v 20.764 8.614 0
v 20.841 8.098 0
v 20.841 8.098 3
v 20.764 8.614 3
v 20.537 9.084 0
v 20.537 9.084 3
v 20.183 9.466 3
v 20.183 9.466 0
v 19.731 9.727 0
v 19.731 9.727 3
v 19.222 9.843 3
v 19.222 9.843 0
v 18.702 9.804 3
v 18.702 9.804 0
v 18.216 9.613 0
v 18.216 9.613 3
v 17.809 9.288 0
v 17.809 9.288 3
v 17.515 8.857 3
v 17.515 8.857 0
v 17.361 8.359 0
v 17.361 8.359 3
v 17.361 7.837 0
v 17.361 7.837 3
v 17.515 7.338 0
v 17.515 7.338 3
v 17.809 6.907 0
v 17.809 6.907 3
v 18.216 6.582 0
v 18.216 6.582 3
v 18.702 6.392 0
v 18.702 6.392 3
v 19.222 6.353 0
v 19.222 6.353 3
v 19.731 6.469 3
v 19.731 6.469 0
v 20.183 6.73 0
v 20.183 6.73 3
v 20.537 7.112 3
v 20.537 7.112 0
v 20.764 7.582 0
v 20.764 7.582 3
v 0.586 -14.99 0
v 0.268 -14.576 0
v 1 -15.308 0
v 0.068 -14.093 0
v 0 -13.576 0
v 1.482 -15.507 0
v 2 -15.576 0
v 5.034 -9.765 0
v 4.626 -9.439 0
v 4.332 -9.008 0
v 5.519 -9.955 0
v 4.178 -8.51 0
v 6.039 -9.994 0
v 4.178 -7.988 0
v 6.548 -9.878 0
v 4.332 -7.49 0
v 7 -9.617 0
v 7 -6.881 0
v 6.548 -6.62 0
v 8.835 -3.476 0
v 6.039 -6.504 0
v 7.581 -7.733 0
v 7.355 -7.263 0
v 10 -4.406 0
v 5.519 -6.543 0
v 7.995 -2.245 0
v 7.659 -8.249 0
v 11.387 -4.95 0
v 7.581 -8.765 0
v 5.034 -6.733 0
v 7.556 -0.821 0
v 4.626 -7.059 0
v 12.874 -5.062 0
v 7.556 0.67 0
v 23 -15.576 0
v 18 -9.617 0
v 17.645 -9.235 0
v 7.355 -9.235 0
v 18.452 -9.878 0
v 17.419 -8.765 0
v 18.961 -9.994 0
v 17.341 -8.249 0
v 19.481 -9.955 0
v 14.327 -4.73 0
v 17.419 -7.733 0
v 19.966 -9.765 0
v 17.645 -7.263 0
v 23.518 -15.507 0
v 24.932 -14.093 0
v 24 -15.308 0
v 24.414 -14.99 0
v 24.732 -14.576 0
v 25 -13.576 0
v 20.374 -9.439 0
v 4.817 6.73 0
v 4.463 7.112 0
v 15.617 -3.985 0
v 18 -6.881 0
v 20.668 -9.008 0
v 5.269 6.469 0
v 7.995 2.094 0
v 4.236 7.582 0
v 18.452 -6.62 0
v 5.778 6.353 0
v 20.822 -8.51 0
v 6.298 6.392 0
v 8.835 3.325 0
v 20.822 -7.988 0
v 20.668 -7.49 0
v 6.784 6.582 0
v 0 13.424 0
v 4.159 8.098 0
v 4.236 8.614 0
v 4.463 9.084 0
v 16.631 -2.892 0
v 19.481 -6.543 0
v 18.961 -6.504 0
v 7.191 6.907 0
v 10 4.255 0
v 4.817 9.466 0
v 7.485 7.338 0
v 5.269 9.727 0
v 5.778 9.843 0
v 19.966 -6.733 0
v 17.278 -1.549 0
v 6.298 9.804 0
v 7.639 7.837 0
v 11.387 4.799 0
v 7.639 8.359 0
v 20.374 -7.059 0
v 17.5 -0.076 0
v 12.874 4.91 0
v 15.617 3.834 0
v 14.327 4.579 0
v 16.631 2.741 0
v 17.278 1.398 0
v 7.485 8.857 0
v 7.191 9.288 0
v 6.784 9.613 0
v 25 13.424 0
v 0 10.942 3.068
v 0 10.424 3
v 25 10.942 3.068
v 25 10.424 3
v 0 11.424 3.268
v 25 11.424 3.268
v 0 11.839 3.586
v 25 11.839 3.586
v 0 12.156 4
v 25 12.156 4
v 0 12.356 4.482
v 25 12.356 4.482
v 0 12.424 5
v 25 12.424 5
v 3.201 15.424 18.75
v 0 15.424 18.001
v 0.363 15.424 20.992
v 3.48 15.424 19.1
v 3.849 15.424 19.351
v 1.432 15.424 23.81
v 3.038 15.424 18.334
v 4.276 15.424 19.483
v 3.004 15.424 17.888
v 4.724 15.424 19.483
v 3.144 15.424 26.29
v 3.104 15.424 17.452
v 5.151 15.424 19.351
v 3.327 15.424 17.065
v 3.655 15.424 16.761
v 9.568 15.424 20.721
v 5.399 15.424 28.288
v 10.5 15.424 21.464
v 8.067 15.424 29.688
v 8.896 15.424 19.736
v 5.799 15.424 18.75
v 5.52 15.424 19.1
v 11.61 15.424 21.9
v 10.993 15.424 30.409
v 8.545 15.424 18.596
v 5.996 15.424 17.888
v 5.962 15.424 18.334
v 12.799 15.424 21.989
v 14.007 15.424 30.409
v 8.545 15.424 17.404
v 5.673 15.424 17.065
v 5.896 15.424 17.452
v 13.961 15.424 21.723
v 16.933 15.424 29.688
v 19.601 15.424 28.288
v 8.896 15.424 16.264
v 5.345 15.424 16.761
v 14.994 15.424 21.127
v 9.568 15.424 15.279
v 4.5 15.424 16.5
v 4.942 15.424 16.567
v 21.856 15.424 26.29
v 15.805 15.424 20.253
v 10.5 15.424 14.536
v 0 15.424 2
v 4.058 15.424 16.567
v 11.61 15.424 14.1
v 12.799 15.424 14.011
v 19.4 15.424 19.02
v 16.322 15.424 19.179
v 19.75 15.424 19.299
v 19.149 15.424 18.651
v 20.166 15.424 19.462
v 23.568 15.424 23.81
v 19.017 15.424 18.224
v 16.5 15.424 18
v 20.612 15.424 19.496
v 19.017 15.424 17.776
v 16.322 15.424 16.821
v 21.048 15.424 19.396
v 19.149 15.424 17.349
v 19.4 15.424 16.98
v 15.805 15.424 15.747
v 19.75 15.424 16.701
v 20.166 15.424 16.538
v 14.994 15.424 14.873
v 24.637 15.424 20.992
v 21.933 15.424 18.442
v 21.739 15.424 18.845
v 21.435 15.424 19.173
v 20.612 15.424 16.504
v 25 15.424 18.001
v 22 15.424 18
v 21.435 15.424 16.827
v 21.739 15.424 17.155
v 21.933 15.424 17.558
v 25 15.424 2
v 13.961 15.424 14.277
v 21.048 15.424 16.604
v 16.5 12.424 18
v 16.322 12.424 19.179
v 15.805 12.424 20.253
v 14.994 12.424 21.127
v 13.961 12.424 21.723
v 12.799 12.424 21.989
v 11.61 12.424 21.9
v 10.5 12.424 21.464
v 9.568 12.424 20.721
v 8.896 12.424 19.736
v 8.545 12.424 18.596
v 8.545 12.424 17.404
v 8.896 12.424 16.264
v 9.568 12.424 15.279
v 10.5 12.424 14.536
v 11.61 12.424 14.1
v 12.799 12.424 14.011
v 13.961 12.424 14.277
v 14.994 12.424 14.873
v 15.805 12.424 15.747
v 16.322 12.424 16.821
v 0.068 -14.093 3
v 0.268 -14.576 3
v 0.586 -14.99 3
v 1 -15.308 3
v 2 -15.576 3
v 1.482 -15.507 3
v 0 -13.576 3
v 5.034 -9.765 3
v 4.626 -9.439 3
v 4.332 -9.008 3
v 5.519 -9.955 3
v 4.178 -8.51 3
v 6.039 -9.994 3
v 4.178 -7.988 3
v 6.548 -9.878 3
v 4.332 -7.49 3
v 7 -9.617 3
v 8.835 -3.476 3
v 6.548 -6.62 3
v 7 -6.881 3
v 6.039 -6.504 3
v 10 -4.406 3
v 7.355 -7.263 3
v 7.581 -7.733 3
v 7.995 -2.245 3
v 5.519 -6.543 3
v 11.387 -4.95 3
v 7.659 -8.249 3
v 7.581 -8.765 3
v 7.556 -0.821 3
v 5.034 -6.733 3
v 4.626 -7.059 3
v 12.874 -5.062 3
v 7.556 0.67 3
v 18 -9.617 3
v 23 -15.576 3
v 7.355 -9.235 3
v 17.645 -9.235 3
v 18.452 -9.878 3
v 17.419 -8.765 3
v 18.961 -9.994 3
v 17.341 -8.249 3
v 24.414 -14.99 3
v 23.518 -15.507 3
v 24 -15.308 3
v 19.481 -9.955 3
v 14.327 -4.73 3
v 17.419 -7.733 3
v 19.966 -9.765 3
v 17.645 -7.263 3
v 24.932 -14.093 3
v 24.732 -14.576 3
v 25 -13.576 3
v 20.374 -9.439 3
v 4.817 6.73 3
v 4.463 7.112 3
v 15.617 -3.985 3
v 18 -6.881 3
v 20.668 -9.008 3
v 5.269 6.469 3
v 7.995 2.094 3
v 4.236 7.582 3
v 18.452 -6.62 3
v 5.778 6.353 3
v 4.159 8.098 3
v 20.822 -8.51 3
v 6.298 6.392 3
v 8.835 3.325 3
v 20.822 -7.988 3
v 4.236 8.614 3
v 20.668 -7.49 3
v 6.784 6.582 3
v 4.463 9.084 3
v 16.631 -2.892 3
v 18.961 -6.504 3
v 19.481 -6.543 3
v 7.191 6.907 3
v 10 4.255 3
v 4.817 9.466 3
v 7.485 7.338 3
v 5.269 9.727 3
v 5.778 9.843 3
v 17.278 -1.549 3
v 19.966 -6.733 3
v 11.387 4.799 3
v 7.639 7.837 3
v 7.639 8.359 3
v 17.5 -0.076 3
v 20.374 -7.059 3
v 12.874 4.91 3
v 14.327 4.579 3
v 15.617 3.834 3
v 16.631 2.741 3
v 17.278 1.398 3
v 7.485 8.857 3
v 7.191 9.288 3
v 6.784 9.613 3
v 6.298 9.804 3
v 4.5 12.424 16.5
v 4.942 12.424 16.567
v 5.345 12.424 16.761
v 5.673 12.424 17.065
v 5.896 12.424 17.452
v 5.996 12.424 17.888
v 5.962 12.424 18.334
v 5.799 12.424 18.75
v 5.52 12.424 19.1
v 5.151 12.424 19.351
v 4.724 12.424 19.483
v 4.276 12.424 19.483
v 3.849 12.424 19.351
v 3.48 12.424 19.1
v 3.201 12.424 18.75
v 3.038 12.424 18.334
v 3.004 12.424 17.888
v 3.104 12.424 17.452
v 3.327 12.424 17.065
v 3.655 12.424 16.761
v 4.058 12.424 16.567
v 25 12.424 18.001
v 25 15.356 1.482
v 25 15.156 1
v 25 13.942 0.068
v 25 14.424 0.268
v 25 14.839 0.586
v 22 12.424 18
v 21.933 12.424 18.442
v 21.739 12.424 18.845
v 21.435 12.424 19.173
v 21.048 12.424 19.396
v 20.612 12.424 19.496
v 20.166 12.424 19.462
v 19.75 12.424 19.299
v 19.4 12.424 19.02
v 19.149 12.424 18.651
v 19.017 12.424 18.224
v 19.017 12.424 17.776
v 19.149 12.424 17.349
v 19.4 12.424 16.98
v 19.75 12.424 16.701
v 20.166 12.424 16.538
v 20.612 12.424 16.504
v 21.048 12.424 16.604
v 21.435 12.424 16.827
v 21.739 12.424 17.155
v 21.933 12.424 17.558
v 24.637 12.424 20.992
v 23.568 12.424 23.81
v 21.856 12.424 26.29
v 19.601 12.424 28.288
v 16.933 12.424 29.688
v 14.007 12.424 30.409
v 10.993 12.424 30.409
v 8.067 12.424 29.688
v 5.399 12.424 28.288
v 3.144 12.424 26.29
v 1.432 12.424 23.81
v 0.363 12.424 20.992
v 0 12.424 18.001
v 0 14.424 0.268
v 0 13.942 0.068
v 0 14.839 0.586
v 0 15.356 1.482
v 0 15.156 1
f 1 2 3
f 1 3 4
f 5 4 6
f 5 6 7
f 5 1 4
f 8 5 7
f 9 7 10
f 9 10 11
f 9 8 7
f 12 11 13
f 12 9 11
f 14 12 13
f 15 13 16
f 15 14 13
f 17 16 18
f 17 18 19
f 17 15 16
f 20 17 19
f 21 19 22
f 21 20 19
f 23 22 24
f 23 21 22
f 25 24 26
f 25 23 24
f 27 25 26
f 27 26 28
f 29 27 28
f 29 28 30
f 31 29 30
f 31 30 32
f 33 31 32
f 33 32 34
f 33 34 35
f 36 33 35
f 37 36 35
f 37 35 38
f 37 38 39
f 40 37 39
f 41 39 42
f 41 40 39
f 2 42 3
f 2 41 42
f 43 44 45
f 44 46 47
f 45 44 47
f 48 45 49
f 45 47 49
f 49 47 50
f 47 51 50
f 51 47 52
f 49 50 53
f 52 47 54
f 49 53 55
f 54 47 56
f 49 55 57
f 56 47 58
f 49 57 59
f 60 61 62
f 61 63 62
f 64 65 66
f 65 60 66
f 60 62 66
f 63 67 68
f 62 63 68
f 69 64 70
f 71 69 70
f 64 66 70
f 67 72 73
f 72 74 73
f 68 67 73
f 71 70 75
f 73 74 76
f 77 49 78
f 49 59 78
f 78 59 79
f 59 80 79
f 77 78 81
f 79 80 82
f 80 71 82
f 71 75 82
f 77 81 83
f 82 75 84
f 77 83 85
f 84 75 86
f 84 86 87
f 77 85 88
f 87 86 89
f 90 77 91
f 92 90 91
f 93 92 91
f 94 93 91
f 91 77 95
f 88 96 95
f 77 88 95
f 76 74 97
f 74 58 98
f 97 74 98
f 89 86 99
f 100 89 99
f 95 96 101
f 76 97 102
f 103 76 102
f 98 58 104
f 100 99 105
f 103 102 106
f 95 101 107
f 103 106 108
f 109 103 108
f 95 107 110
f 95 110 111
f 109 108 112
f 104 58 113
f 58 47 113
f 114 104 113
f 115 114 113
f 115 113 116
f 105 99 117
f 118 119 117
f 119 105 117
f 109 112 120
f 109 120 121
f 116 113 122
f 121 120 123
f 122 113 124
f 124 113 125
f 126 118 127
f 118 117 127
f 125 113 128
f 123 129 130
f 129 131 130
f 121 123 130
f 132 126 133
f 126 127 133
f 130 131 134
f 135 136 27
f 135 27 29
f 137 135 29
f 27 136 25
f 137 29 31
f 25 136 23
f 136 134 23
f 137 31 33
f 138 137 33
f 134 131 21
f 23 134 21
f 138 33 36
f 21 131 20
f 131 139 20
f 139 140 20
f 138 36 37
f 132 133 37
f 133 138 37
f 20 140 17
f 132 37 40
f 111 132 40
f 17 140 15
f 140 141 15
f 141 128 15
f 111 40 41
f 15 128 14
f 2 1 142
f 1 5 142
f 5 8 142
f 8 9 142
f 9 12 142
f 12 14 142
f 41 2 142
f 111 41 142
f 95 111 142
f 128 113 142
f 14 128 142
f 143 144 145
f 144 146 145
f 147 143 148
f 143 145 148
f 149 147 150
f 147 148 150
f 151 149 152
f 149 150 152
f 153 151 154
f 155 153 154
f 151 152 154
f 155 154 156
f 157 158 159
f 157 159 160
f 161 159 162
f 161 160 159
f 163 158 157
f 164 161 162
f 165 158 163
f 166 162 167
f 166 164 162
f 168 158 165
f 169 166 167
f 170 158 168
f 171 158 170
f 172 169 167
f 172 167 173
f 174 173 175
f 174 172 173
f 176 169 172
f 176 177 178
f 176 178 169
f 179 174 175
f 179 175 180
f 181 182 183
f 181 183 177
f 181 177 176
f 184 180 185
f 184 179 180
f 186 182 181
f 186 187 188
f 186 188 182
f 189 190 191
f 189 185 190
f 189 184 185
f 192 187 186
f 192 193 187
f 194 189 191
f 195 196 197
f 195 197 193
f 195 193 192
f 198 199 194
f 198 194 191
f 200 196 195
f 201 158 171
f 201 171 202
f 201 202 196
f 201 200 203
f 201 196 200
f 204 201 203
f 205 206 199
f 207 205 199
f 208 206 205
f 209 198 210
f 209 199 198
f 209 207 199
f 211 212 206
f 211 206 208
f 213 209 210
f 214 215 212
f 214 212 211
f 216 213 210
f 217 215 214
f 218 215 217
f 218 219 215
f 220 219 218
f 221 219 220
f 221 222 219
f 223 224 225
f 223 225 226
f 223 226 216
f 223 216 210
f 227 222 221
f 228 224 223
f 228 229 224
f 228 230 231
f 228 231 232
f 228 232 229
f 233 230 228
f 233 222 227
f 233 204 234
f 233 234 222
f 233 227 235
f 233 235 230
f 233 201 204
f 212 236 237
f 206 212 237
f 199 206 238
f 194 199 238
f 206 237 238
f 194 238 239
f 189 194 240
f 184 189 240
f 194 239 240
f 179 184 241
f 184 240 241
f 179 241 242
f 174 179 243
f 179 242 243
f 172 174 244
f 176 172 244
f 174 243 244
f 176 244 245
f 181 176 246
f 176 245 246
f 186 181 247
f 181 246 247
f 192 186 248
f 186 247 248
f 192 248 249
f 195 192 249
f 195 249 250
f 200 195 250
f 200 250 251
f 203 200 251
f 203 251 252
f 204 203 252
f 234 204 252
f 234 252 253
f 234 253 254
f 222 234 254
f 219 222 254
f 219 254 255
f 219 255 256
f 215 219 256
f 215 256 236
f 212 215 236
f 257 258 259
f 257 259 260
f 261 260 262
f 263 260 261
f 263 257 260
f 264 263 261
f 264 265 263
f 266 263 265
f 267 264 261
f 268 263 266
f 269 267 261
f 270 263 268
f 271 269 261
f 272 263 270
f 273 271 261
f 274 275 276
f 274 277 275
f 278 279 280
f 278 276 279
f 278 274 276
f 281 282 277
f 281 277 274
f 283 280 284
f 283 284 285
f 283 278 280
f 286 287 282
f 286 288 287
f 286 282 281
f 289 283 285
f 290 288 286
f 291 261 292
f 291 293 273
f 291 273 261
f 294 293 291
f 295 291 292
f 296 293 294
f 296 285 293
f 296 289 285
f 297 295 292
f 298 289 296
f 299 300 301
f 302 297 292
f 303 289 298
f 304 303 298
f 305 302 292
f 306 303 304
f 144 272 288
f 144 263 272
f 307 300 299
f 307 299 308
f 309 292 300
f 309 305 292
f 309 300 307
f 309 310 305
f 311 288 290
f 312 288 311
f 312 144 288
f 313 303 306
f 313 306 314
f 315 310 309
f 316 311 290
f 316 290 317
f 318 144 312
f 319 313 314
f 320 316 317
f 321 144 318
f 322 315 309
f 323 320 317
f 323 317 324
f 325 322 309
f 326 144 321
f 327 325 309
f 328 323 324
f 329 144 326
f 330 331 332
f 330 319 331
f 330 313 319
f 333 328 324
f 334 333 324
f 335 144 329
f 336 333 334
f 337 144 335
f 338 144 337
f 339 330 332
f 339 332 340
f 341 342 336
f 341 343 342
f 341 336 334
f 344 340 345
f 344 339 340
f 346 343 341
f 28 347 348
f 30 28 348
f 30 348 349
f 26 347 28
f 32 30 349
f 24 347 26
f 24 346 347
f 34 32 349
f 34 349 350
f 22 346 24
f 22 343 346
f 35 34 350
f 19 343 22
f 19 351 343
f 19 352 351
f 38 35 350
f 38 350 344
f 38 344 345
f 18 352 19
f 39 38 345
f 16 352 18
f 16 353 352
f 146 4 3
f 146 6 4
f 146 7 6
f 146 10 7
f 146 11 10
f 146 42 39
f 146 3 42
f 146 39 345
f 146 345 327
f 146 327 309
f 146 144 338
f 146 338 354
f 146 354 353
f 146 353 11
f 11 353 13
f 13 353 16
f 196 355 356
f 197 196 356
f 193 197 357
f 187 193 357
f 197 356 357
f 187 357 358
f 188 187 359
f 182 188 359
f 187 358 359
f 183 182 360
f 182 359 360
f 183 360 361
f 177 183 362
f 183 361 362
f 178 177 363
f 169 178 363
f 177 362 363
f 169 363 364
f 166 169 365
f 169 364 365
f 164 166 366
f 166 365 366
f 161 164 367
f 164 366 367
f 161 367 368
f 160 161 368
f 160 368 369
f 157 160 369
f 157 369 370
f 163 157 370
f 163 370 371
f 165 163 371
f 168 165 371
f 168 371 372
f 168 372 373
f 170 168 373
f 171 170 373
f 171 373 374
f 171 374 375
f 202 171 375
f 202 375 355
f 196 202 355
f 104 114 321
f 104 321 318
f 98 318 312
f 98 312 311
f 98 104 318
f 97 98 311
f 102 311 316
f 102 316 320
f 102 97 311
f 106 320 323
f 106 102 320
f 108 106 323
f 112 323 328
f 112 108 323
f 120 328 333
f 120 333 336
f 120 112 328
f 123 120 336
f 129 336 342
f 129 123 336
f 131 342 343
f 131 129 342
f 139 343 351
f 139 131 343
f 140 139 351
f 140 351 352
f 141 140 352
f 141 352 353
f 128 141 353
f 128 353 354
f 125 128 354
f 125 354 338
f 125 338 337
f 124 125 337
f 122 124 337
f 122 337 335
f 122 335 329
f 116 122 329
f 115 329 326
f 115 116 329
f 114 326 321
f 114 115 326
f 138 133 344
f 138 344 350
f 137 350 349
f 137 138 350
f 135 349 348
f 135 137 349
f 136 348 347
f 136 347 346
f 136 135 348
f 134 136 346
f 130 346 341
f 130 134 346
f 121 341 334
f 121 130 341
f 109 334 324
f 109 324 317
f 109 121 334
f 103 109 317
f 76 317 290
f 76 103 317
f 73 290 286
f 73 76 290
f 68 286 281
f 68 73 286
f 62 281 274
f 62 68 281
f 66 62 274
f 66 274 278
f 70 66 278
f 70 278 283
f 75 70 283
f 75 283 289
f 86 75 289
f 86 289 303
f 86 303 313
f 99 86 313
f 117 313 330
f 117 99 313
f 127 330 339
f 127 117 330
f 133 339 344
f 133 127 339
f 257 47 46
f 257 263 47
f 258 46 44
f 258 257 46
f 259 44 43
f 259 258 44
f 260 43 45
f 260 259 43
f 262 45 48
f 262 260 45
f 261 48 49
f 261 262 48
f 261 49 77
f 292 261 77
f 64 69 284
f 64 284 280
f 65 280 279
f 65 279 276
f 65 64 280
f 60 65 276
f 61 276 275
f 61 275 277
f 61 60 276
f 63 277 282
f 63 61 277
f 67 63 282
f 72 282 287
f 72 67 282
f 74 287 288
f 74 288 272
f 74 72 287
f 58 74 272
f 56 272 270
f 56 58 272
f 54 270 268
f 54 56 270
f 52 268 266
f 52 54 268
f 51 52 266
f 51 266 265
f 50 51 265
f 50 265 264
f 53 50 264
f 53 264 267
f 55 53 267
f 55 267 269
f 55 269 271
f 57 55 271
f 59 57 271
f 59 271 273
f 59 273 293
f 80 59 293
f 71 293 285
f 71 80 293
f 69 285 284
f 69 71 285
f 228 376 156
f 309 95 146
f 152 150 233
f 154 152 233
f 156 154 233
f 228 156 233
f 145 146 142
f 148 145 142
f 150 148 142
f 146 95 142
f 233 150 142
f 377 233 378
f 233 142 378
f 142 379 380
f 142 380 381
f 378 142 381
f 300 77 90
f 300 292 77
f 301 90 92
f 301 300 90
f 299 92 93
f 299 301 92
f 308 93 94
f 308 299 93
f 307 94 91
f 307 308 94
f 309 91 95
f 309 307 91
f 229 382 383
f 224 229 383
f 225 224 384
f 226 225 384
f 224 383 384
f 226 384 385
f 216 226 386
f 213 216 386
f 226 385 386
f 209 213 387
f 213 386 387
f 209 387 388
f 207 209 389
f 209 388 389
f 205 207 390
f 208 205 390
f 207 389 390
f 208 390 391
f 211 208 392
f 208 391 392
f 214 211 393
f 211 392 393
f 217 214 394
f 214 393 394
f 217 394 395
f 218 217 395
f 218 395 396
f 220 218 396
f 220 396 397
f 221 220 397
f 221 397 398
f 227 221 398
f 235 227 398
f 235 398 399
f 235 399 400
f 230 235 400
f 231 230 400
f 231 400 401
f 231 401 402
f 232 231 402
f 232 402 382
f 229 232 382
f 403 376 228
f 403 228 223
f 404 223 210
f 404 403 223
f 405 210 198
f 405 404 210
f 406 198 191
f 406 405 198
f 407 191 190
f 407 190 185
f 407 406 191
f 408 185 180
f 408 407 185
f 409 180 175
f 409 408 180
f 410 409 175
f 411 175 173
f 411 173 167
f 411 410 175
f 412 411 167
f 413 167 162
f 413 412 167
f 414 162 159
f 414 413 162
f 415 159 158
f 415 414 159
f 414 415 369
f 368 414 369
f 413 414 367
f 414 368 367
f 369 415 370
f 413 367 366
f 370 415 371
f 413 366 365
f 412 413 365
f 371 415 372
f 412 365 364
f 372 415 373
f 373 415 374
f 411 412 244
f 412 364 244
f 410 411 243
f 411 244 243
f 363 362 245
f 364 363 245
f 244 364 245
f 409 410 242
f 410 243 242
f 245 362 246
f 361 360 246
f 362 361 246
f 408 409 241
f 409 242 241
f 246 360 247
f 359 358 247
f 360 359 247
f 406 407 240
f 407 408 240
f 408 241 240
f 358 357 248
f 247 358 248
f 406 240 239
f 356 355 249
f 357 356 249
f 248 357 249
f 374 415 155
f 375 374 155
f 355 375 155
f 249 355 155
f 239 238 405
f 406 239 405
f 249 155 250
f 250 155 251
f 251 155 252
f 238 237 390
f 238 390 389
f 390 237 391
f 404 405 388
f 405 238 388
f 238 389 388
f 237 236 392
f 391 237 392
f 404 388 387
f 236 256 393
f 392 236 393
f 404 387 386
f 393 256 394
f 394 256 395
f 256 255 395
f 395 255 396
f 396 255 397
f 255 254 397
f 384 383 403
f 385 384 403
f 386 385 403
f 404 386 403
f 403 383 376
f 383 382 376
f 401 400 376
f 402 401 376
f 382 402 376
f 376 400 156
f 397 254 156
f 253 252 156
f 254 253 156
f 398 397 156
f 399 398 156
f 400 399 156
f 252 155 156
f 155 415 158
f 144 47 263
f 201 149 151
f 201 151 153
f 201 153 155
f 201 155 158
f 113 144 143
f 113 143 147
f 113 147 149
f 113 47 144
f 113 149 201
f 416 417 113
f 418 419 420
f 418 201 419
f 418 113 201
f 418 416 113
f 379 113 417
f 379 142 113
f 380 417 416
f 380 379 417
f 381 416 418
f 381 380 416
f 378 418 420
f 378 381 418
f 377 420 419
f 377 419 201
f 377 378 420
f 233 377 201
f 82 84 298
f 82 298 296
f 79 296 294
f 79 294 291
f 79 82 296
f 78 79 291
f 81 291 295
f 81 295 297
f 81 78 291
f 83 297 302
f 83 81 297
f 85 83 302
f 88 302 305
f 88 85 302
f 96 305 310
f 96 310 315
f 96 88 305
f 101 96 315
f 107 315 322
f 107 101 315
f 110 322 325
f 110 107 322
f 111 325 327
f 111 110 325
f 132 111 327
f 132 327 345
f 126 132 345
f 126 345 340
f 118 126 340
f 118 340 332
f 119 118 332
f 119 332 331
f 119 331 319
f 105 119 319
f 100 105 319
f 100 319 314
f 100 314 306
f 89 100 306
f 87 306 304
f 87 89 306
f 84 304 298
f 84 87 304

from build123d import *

# Parameters (mm, degrees)
ESQUISSE1_W             = 25
ESQUISSE1_H             = 31
ESQUISSE1_R             = 5
ESQUISSE1_R_2           = 1.75
BOSS_EXTRU_1_DEPTH      = 3
ESQUISSE2_W             = 25
ESQUISSE2_H             = 3
BOSS_EXTRU_2_DEPTH      = 30
ESQUISSE3_R             = 4
ESQUISSE3_R_2           = 1.5
ENL_V_MAT_EXTRU_1_DEPTH = 30
CONG_1_R                = 2


with BuildPart() as part:
    # Esquisse1 → Boss.-Extru.1 (new body)
    with BuildSketch(Plane.XY):
        with Locations((12.5, -0.075620767)):
            Rectangle(ESQUISSE1_W, ESQUISSE1_H)
        with Locations((12.5, -0.075620767)):
            Circle(ESQUISSE1_R, mode=Mode.SUBTRACT)
        with Locations((19.091400737, 8.097716147)):
            Circle(ESQUISSE1_R_2, mode=Mode.SUBTRACT)
        with Locations(Location((5.908599263, 8.097716147, 0), (0, 0, 180))):
            Circle(ESQUISSE1_R_2, mode=Mode.SUBTRACT)
        with Locations(Location((19.091400737, -8.248957682, 0), (0, 0, 180))):
            Circle(ESQUISSE1_R_2, mode=Mode.SUBTRACT)
        with Locations((5.908599263, -8.248957682)):
            Circle(ESQUISSE1_R_2, mode=Mode.SUBTRACT)
    extrude(amount=BOSS_EXTRU_1_DEPTH)

    # Esquisse2 → Boss.-Extru.2 (add)
    with BuildSketch(Plane.XY.offset(3)):
        with Locations((12.5, 13.924379233)):
            Rectangle(ESQUISSE2_W, ESQUISSE2_H)
    extrude(amount=BOSS_EXTRU_2_DEPTH)

    # Esquisse3 → Enlèv. mat.-Extru.1 (cut)
    with BuildSketch(Plane.XZ.offset(-12.424379233)):
        with Locations((12.5, 18)):
            Circle(ESQUISSE3_R)
        with Locations((20.5, 18)):
            Circle(ESQUISSE3_R_2)
        with Locations(Location((4.5, 18, 0), (0, 0, 270))):
            Circle(ESQUISSE3_R_2)
        with BuildLine():
            Line((0, 18.000546853), (0, 33))
            Line((0, 33), (25.000000024, 33))
            Line((25.000000024, 33), (25.000000024, 18.000546853))
            ThreePointArc((25.000000024, 18.000546853), (12.500000012, 30.500546865), (0, 18.000546853))
        make_face()
    extrude(amount=-ENL_V_MAT_EXTRU_1_DEPTH, mode=Mode.SUBTRACT)

    # Congé1
    cong_1_edges = [part.edges().sort_by_distance(p)[0] for p in [
        (12.5, 12.424379233, 3),
        (12.5, 15.424379233, 0),
        (25, -15.575620767, 1.5),
        (0, -15.575620767, 1.5),
    ]]
    fillet(cong_1_edges, radius=CONG_1_R)


solid = part.part
